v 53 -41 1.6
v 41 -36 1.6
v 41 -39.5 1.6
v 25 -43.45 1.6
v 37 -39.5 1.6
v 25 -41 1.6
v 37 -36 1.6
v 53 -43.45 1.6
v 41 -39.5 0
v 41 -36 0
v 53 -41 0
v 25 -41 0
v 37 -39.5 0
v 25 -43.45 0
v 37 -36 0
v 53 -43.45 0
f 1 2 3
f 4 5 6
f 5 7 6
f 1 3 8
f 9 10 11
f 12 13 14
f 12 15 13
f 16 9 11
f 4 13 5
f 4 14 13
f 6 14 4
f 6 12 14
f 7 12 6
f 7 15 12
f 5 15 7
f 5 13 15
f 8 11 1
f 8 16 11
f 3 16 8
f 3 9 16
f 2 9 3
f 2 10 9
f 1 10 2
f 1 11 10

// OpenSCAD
// Antweight "Passive Aggressive" v0.1 - invertible pusher, passive weapons only.
// Weapon: gravity-hinged wedge with 4 wedgelets (forks). It hangs on two M2 pivot screws between the front
// "mandibles" and drops onto the floor in both orientations; printed ledges on the mandibles stop the swing.
// Rear: three spikes (tail skids). Angry chevron eyes in the lid (transparent inlay), chevron vents.
// Same drive as the racer: 34x10 wheels + N20 (Pololu). Wheels stick out top and bottom (invertible).
// Axle close to the wedge, so an opponent on the wedge loads the wheels; the tail spikes skid on the floor.
// Coordinates = PCB-local: x = width, y = length (y = 0 = narrow PCB edge = front), z = 0 = tub bottom.
// Driving direction is -y.

part = "lid_glass"; // [assembly, tub, lid, lid_glass, wedge, motor_clamp, test_motor, test_hinge, test_wedge]
$fn = 64;

/* [PCB] */
pcb_w = 78;
pcb_l = 56;
pcb_t = 1.6;
pcb_clear = 0.3;
pcb_gap = 0.3;                       // PCB above the motor clamps
pcb_holes = [[9.14, 3.14], [68.86, 3.14], [3.95, 44.56], [74.05, 44.56]];
lid_screw_holes = [0, 1];            // front PCB holes: M2 x 16 through lid boss + PCB into the tub
switch_slot = [[63.65, 38.65], [66.65, 45.65]];
switch_holes = [[65.15, 34.7], [65.15, 49.6]];   // switch mounting holes (pcb-dimensions.DXF)
switch_hole_d = 2;

/* [Components (estimates, measure!)] */
drv_center = [37.93, 15.5];          // DRV8833 in its socket under the PCB
drv_pins = 6;
drv_w = 18;
drv_len = drv_pins * 2.54 + (22.5 - 8 * 2.54);
drv_body = [drv_center - [drv_len / 2, drv_w / 2], drv_center + [drv_len / 2, drv_w / 2]];
drv_h = 9;
esp_body = [[28.1, 31.7], [48.4, 49.5]];
esp_h = 4;                           // ESP32-C3 on top, soldered low (max ~2 mm header spacer)
battery = [50, 30, 8];
battery_y0 = 33;                     // under the PCB, behind the motor clamps

/* [Drive] */
wheel_d = 34;
wheel_w = 10;
wheel_gap = 1;
ground_clearance = 1.5;              // body to floor, both orientations
axle_y = 21;
// N20 (Pololu micro metal gearmotor): gearbox 12 x 10 x 9, can d12 with flats at 10
gearbox_l = 9;
gb_w = 12;
gb_h = 10;
motor_d = 12;
motor_l = 15;
motor_term_l = 3;
shaft_d = 3;
shaft_l = 10;
shaft_boss_d = 5;
motor_fit = 0.25;                    // per side, FDM slide fit
drv_clear = 0.3;

/* [Motor clamp] */
clamp_squeeze = 0.2;
clamp_wall = 1.6;
clamp_top_t = 1.2;
clamp_screw_x = 12;
clamp_screw_margin = 1;
clamp_boss_d = 4.4;
clamp_head_d = 4.2;
clamp_head_recess = 1.6;

/* [Chassis] */
wall = 1.6;
side_t = 2.0;                        // outer wall beside the wheel
front_t = 2.0;
floor_t = 1.2;
lid_t = 1.6;
iw_t = 1.4;
gb_gap = 0.3;
standoff_d = 5;
pilot_d = 1.7;
screw_clear_d = 2.4;
screw_head_d = 4.2;
screw_head_recess = 1.4;
lid_lip_h = 2;
lid_lip_t = 1.2;
lid_fit = 0.2;
snap_x = [25, 53];                   // snaps on the rear wall
snap_r = 0.8;
strap_w = 11;
strap_slot = 2;
strap_x = [33, 45];
edge_c = 1.6;                        // stepped 45 degree chamfer, top and bottom
layer_h = 0.2;

/* [Tail spikes] */
spike_x = [-16, 0, 16];              // relative to the centre line
spike_w = 10;
spike_l = 7;

/* [Wedge + hinge] */
tube_d = 7;                          // hinge tube along the wedge back edge
hinge_gap = 1;                       // tube to body front
hinge_dz = 2.8;                      // pivot above the mid-plane: the plate sits under the pin, evens out both rest angles
pin_pilot_d = 1.7;                   // M2 pivot screw threads into the mandible
pin_clear_d = 2.4;                   // the wedge turns on the screw shank
pin_head_recess = 1.5;
ear_t = 5;                           // mandible thickness
ear_fit = 0.4;                       // per side, wedge to mandible
ear_apex = 8;                        // mandible point ahead of the pivot
ear_r = 4.5;
plate_t = 2.4;
plate_l = 26;                        // pivot to plate edge
plate_corner = 4;
fork_x = [-42, -18, 18, 42];         // wedgelets, relative to the centre line
fork_l = 8;
fork_w0 = 7;
fork_w1 = 2.5;
bevel_l = 12;                        // top bevel back from the fork tips
tip_t = 0.6;
stop_angle = 50;                     // swing limit both ways (from horizontal)
ledge_u = [2.5, 10];                 // stop ledge, distance along the plate from the pivot
ledge_w = 1.5;                       // into the wedge path
ledge_t = 1.5;

/* [Design] */
line_h = 1.0;                        // character line at axle height (slicer height range)
line_d = 0.4;
arch_r = 1.5;
eye_y = 36;
eye_gap = 2;
eye_len = 12;
eye_rise = 5;
eye_w = 3.5;
chev_w = 2.5;
chev_pitch = 5.5;
chev_rise = 0.5;                     // rise per mm half-width (tan of the chevron angle)
floor_chevrons = [[[31, 6], [47, 28]], [[16, 36], [62, 60]]];
lid_vents = [[26, 56.5], [52, 64]];

/* [Colours] */
palette = "stealth_copper"; // [stealth_copper, gunmetal_silver, hazard_red]
// [tub, character line, lid + clamps, eyes, wedge], each [filament, preview hex]
pal = palette == "gunmetal_silver"
        ? [["dark gray", "#3C3F41"], ["copper", "#B87333"], ["silver", "#C4C7CA"], ["transparent", "#E8F0F2"], ["silver", "#C4C7CA"]]
    : palette == "hazard_red"
        ? [["dark gray", "#3C3F41"], ["red", "#C8102E"], ["red", "#C8102E"], ["transparent", "#E8F0F2"], ["silver", "#C4C7CA"]]
        : [["dark gray", "#3C3F41"], ["copper", "#B87333"], ["dark gray", "#2E3032"], ["transparent", "#E8F0F2"], ["copper", "#B87333"]];

// ---------- derived ----------
H = wheel_d - 2 * ground_clearance;
axle_z = H / 2;
clamp_top_z = axle_z + gb_h / 2 - clamp_squeeze + clamp_top_t;
pcb_z = clamp_top_z + pcb_gap;
tub_h = H - lid_t;
motor_total = gearbox_l + motor_l + motor_term_l;
mount_l = gearbox_l + motor_l + motor_fit;
clamp_screw_y = gb_w / 2 + motor_fit + clamp_screw_margin + screw_clear_d / 2;
gf_x = min(drv_body[0][0] - drv_clear - motor_total,
           pcb_w - (drv_body[1][0] + drv_clear + motor_total));
iw_x1 = gf_x - gb_gap;
iw_x0 = iw_x1 - iw_t;
wheel_x0 = iw_x0 - wheel_gap - wheel_w;
ow_x1 = wheel_x0 - wheel_gap;
ow_x0 = ow_x1 - side_t;
cx = pcb_w / 2;
width = pcb_w - 2 * ow_x0;
in_y0 = -pcb_clear;
front_y = in_y0 - front_t;
well_y0 = in_y0;
well_y1 = axle_y + wheel_d / 2 + wheel_gap;
pod_y1 = well_y1 + iw_t;
battery_pos = [cx - battery[0] / 2, battery_y0];
bay_y1 = battery_y0 + battery[1] + 1 + strap_slot + 0.5;
in_y1 = bay_y1 + pcb_clear;
rear_y = in_y1 + wall;
arch_half = sqrt(pow(wheel_d / 2, 2) - pow(axle_z - floor_t, 2)) + wheel_gap;
arch_half_lid = sqrt(pow(wheel_d / 2, 2) - pow(tub_h - axle_z, 2)) + wheel_gap;
n_chamf = round(edge_c / layer_h);
line_z0 = round((axle_z - line_h / 2) / layer_h) * layer_h;

r_k = tube_d / 2;
L_tot = plate_l + fork_l;
z_h = axle_z + hinge_dz;
y_h = front_y - r_k - hinge_gap;
ear_in = ow_x0 + ear_t;
wx0 = ear_in + ear_fit;
wx1 = pcb_w - wx0;
// resting on wheels + tail spikes: body bottom height above the floor at the pivot
y_skid = rear_y + spike_l - edge_c / sin(atan(spike_w / 2 / spike_l));
lift = ground_clearance * (1 + (axle_y - y_h) / (y_skid - axle_y));
h_up = z_h + lift;
h_dn = H - z_h + lift;
rest_up = asin(h_up / sqrt(pow(L_tot, 2) + pow(r_k, 2))) - atan2(r_k, L_tot);
rest_dn = asin(h_dn / sqrt(pow(L_tot, 2) + pow(r_k - tip_t, 2))) + atan2(r_k - tip_t, L_tot);
tip_y = y_h - (L_tot * cos(rest_up) + r_k * sin(rest_up));

echo(str("Passive Aggressive ", width, " x ", rear_y + spike_l - tip_y, " x ", H, " mm (wedge resting), body ",
         rear_y + spike_l - front_y, " mm, wheels +-", ground_clearance, " mm"));
echo(str("Wedge rest angle upright ", rest_up, " deg, inverted ", rest_dn, " deg, stops +-", stop_angle,
         " deg, pivot y ", y_h, " z ", z_h));
echo(str("PCB bottom z = ", pcb_z, ", ESP top ", pcb_z + pcb_t + esp_h, " / lid underside ", tub_h,
         ", lid boss ", tub_h - pcb_z - pcb_t, " mm"));
echo(str("Colours: tub ", pal[0][0], " with ", pal[1][0], " band z ", line_z0, "-", line_z0 + line_h,
         "; lid + clamps ", pal[2][0], "; eyes ", pal[3][0], "; wedge ", pal[4][0]));
echo("Screws: 2x M2x10 pivot (threadlock), 2x M2x16 lid, 2x M2x6 rear PCB, 4x M2x10 motor clamps");

assert(well_y1 + iw_t <= 41 - pcb_clear, "wheel well hits wide PCB part");
assert(gf_x - shaft_l > ow_x1, "motor shaft hits outer wall");
assert(pcb_z + pcb_t + esp_h <= tub_h - 0.5, "ESP32 hits the lid");
assert(floor_t + battery[2] < pcb_z - drv_h, "battery hits the DRV8833 under the PCB");
assert(min(strap_x) - strap_w / 2 > gf_x + mount_l && max(strap_x) + strap_w / 2 < pcb_w - gf_x - mount_l,
       "strap slot hits motor cradle");
assert(battery_y0 > axle_y + clamp_screw_y + clamp_boss_d / 2, "battery hits clamp boss");
assert(rest_up < stop_angle - 5 && rest_dn < stop_angle - 5, "wedge rests on its stop, not on the floor");
assert(sqrt(pow(ledge_u[0], 2) + pow(r_k, 2)) > r_k + 0.5, "stop ledge hits the hinge tube");

// ---------- 2D helpers ----------
module mirror_x(m) {
    if (m == 0) children();
    else translate([pcb_w, 0, 0]) mirror([1, 0, 0]) children();
}

module rrect(r0, r1, r) translate([r0[0] + r, r0[1] + r]) offset(r = r) square([r1[0] - r0[0] - 2 * r, r1[1] - r0[1] - 2 * r]);

module slot2d(p0, p1, w) hull() { translate(p0) circle(d = w); translate(p1) circle(d = w); }

module pcb_outline()
    polygon([[6, 0], [72, 0], [72, 41], [78, 41], [78, 48], [70, 56],
             [8, 56], [0, 48], [0, 41], [6, 41]]);

module core2d() hull() {
    pcb_outline();
    translate(battery_pos) square([battery[0], bay_y1 - battery_y0]);
}

module pod2d() translate([ow_x0, front_y]) square([width, pod_y1 - front_y]);

module hull2d() hull() { pod2d(); offset(delta = pcb_clear + wall) core2d(); }

module spikes2d()
    for (dx = spike_x) translate([cx + dx, rear_y - 0.01])
        polygon([[-spike_w / 2, 0], [spike_w / 2, 0], [0, spike_l]]);

// coffin plan: wide wheel pods at the front, tapering tail with spikes
module plan() union() { hull2d(); spikes2d(); }

module outline_inner() intersection() {
    offset(delta = -wall) hull2d();
    translate([-50, in_y0]) square([200, 200]);
}

module well_rect() translate([ow_x1, well_y0]) square([iw_x0 - ow_x1, well_y1 - well_y0]);

module well_zone2d() translate([-50, -50]) square([iw_x1 + lid_fit + 50, pod_y1 + lid_fit + 50]);

module arch_opening(half) rrect([ow_x1, axle_y - half], [iw_x0, axle_y + half], arch_r);

// chevrons pointing forward (-y), clipped to the rectangle
module chevrons2d(r0, r1) intersection() {
    translate(r0 + [chev_w / 2, chev_w / 2]) square(r1 - r0 - [chev_w, chev_w]);
    mx = (r0[0] + r1[0]) / 2;
    rise = (mx - r0[0]) * chev_rise;
    for (y = [r0[1] - rise : chev_pitch : r1[1]]) {
        slot2d([r0[0], y + rise], [mx, y], chev_w);
        slot2d([mx, y], [r1[0], y + rise], chev_w);
    }
}

// angry eyes: slits rising to the outside, inner ends forward
module eyes2d()
    for (s = [-1, 1])
        polygon([[cx + s * eye_gap, eye_y], [cx + s * (eye_gap + eye_len), eye_y + eye_rise],
                 [cx + s * (eye_gap + eye_len), eye_y + eye_rise + eye_w * 0.7], [cx + s * eye_gap, eye_y + eye_w]]);

module switch_win2d() {
    translate(switch_slot[0]) square(switch_slot[1] - switch_slot[0]);
    for (p = switch_holes) translate(p) circle(d = switch_hole_d);
}

// ---------- 3D helpers ----------
module yz_extrude(x0, w) translate([x0, 0, 0]) rotate([90, 0, 90]) linear_extrude(w) children();

// body slab with stepped 45 degree chamfers top and bottom, clipped to z0..z1
module body_solid(z0 = 0, z1 = H) intersection() {
    union() {
        for (i = [0 : n_chamf - 1]) {
            d = edge_c - (i + 0.5) * layer_h;
            translate([0, 0, i * layer_h]) linear_extrude(layer_h + 0.01) offset(delta = -d) plan();
            translate([0, 0, H - (i + 1) * layer_h]) linear_extrude(layer_h + 0.01) offset(delta = -d) plan();
        }
        translate([0, 0, edge_c]) linear_extrude(H - 2 * edge_c + 0.01) plan();
    }
    translate([-100, -100, z0]) cube([400, 400, z1 - z0]);
}

// (y, z) side view around the pivot: u forward (-y), v up
module hinge2d() translate([y_h, z_h]) mirror([1, 0]) children();

// ---------- motor mount ----------
module motor_cavity() {
    w = gb_w + 2 * motor_fit;
    translate([0, axle_y, axle_z]) {
        yz_extrude(iw_x1 - 0.01, gf_x - iw_x1 + gearbox_l + motor_fit + 0.01)
            translate([-w / 2, -gb_h / 2]) square([w, gb_h - clamp_squeeze]);
        yz_extrude(gf_x + gearbox_l, motor_l + motor_term_l + 2) intersection() {
            circle(d = motor_d + 2 * motor_fit);
            translate([-w / 2, -gb_h / 2]) square([w, gb_h - clamp_squeeze]);
        }
    }
}

module clamp_screws(z, h, d) {
    for (s = [-1, 1]) translate([gf_x + clamp_screw_x, axle_y + s * clamp_screw_y, z]) cylinder(d = d, h = h);
}

module clamp_ears(z, h) {
    cw = gb_w + 2 * motor_fit;
    for (s = [-1, 1]) hull() {
        translate([gf_x + clamp_screw_x, axle_y + s * clamp_screw_y, z]) cylinder(d = clamp_boss_d, h = h);
        translate([gf_x + clamp_screw_x - clamp_boss_d / 2, axle_y + (s < 0 ? -cw / 2 - clamp_wall : cw / 2), z])
            cube([clamp_boss_d, clamp_wall, h]);
    }
}

module motor_cradle() {
    x0 = iw_x1 - 0.01;
    l = gf_x + mount_l - x0;
    cw = gb_w + 2 * motor_fit;
    difference() {
        union() {
            translate([x0, axle_y - cw / 2 - clamp_wall, axle_z - gb_h / 2 - 1.2])
                cube([l, cw + 2 * clamp_wall, gb_h / 2 + 1.2]);
            for (s = [-1, 1]) translate([x0, axle_y + (s < 0 ? -cw / 2 - clamp_wall : cw / 2), 0])
                cube([l, clamp_wall, axle_z]);
            for (rx = [x0, gf_x + gearbox_l - 1, gf_x + mount_l - clamp_wall])
                translate([rx, axle_y - cw / 2, 0]) cube([clamp_wall, cw, axle_z]);
            clamp_ears(0, axle_z);
        }
        motor_cavity();
        clamp_screws(axle_z - 8, 9, pilot_d);
    }
}

module motor_clamp() {
    x0 = iw_x1 + 0.2;
    cw = gb_w + 2 * motor_fit;
    difference() {
        union() {
            translate([x0, axle_y - cw / 2 - clamp_wall, axle_z])
                cube([gf_x + mount_l - x0, cw + 2 * clamp_wall, clamp_top_z - axle_z]);
            clamp_ears(axle_z, clamp_top_z - axle_z);
        }
        motor_cavity();
        clamp_screws(axle_z - 1, clamp_top_z - axle_z + 2, screw_clear_d);
        clamp_screws(clamp_top_z - clamp_head_recess, clamp_head_recess + 1, clamp_head_d);
    }
}

// ---------- mandibles (wedge hinge ears with swing stops) ----------
module ledges2d() hinge2d() {
    rotate(-stop_angle) translate([ledge_u[0], -r_k - ledge_t]) square([ledge_u[1] - ledge_u[0], ledge_t]);
    rotate(stop_angle) translate([ledge_u[0], -r_k + plate_t]) square([ledge_u[1] - ledge_u[0], ledge_t]);
}

module ear2d() union() {
    hull() {
        translate([front_y - 0.01, 0]) square([0.01, H]);
        translate([y_h - 2, 0]) square([0.01, H]);
        translate([y_h, z_h]) circle(r = ear_r);
        translate([y_h - ear_apex, z_h]) circle(r = 0.5);
        ledges2d();
    }
    // root into the front wall, below the lid
    translate([front_y - 0.01, 0]) square([edge_c + 0.01, tub_h]);
}

module ears() for (m = [0, 1]) mirror_x(m) difference() {
    union() {
        yz_extrude(ow_x0, ear_t) ear2d();
        yz_extrude(ear_in - 0.01, ledge_w + 0.01) ledges2d();
    }
    translate([ow_x0 - 1, y_h, z_h]) rotate([0, 90, 0]) cylinder(d = pin_pilot_d, h = ear_t + 2);
    translate([ow_x0 - 1, y_h, z_h]) rotate([0, 90, 0]) cylinder(d = screw_head_d, h = pin_head_recess + 1);
}

// ---------- tub ----------
module well_boxes()
    intersection() {
        body_solid(0, tub_h);
        for (m = [0, 1]) mirror_x(m) linear_extrude(tub_h) difference() {
            offset(delta = iw_t) well_rect();
            well_rect();
        }
    }

module character_line()
    translate([0, 0, line_z0]) linear_extrude(line_h) difference() {
        offset(delta = 1) plan();
        offset(delta = -line_d) plan();
    }

module tub() {
    difference() {
        union() {
            difference() {
                union() {
                    difference() {
                        body_solid(0, tub_h);
                        translate([0, 0, floor_t]) linear_extrude(tub_h) outline_inner();
                    }
                    well_boxes();
                }
                character_line();
            }
            ears();
            for (m = [0, 1]) mirror_x(m) motor_cradle();
            for (p = pcb_holes) translate([p[0], p[1], 0]) cylinder(d = standoff_d, h = pcb_z);
        }
        for (m = [0, 1]) mirror_x(m) {
            translate([0, 0, -1]) linear_extrude(floor_t + 2) arch_opening(arch_half);
            // open-top shaft slot: motor with wheel fitted drops straight in
            hull() for (z = [axle_z, tub_h + 1])
                translate([iw_x0 - 1, axle_y, z]) rotate([0, 90, 0]) cylinder(d = shaft_boss_d, h = iw_t + 2);
        }
        for (p = pcb_holes) translate([p[0], p[1], pcb_z - 8]) cylinder(d = pilot_d, h = 9);
        for (sx = strap_x, sy = [battery_pos[1] - 1 - strap_slot, battery_pos[1] + battery[1] + 1])
            translate([sx - strap_w / 2, sy, -1]) cube([strap_w, strap_slot, floor_t + 2]);
        translate([0, 0, -1]) linear_extrude(floor_t + 2) for (r = floor_chevrons) chevrons2d(r[0], r[1]);
        for (sx = snap_x) translate([sx, in_y1, tub_h - lid_lip_h / 2]) sphere(r = snap_r);
    }
}

// ---------- lid (prints upside down) ----------
module lid() {
    difference() {
        union() {
            body_solid(tub_h, H);
            translate([0, 0, tub_h - lid_lip_h]) linear_extrude(lid_lip_h + 0.01) difference() {
                offset(delta = -lid_fit) outline_inner();
                offset(delta = -lid_fit - lid_lip_t) outline_inner();
                for (m = [0, 1]) mirror_x(m) well_zone2d();
            }
            for (i = lid_screw_holes) translate([pcb_holes[i][0], pcb_holes[i][1], pcb_z + pcb_t])
                cylinder(d = standoff_d, h = tub_h - pcb_z - pcb_t + 0.01);
            for (sx = snap_x) translate([sx, in_y1 - lid_fit, tub_h - lid_lip_h / 2]) sphere(r = snap_r - 0.2);
        }
        for (m = [0, 1]) mirror_x(m) translate([0, 0, tub_h - 1]) linear_extrude(lid_t + 2) arch_opening(arch_half_lid);
        for (i = lid_screw_holes) {
            translate([pcb_holes[i][0], pcb_holes[i][1], pcb_z]) cylinder(d = screw_clear_d, h = H);
            translate([pcb_holes[i][0], pcb_holes[i][1], H - screw_head_recess]) cylinder(d = screw_head_d, h = 2);
        }
        translate([0, 0, tub_h - 1]) linear_extrude(lid_t + 2) {
            switch_win2d();
            chevrons2d(lid_vents[0], lid_vents[1]);
        }
        translate([0, 0, tub_h - 1]) linear_extrude(lid_t + 2) eyes2d();
    }
}

// transparent inlay for the eyes: load as extra part of the lid (same transform)
module lid_glass() translate([0, 0, tub_h]) linear_extrude(lid_t) eyes2d();

// ---------- wedge ----------
module wedge_plan2d() {
    polygon([[wx0, 0], [wx1, 0], [wx1, plate_l - plate_corner], [wx1 - plate_corner, plate_l],
             [wx0 + plate_corner, plate_l], [wx0, plate_l - plate_corner]]);
    for (fx = fork_x) translate([cx + fx, 0])
        polygon([[-fork_w0 / 2, plate_l - 0.01], [fork_w0 / 2, plate_l - 0.01], [fork_w1 / 2, L_tot], [-fork_w1 / 2, L_tot]]);
}

// local frame: x = width, y = u (forward from the pivot), z = v; pivot on the x axis, plate under the pin
module wedge_local() difference() {
    union() {
        intersection() {
            translate([0, 0, -r_k]) linear_extrude(plate_t) wedge_plan2d();
            yz_extrude(wx0 - 1, wx1 - wx0 + 2)
                polygon([[-1, -r_k - 1], [L_tot + 1, -r_k - 1], [L_tot + 1, -r_k + tip_t],
                         [L_tot - bevel_l, -r_k + plate_t + 0.01], [-1, -r_k + plate_t + 0.01]]);
        }
        translate([wx0, 0, 0]) rotate([0, 90, 0]) cylinder(d = tube_d, h = wx1 - wx0);
    }
    translate([wx0 - 1, 0, 0]) rotate([0, 90, 0]) cylinder(d = pin_clear_d, h = wx1 - wx0 + 2);
}

module wedge_placed(a) translate([pcb_w, y_h, z_h]) rotate([0, 0, 180]) rotate([a, 0, 0]) wedge_local();

// ---------- ghost components ----------
module ghosts() {
    for (m = [0, 1]) mirror_x(m) {
        color("black", 0.6) translate([wheel_x0, axle_y, axle_z]) rotate([0, 90, 0]) cylinder(d = wheel_d, h = wheel_w);
        color("silver", 0.6) translate([0, axle_y, axle_z]) {
            yz_extrude(gf_x, gearbox_l) square([gb_w, gb_h], center = true);
            yz_extrude(gf_x + gearbox_l, motor_l) intersection() {
                circle(d = motor_d);
                square([gb_w, gb_h], center = true);
            }
        }
        color("silver", 0.6) translate([gf_x - shaft_l, axle_y, axle_z]) rotate([0, 90, 0]) cylinder(d = shaft_d, h = shaft_l);
    }
    color("green", 0.5) translate([0, 0, pcb_z]) linear_extrude(pcb_t) pcb_outline();
    color("purple", 0.6) translate([drv_body[0][0], drv_body[0][1], pcb_z - drv_h])
        cube([drv_body[1][0] - drv_body[0][0], drv_body[1][1] - drv_body[0][1], drv_h]);
    color("blue", 0.6) translate([esp_body[0][0], esp_body[0][1], pcb_z + pcb_t])
        cube([esp_body[1][0] - esp_body[0][0], esp_body[1][1] - esp_body[0][1], esp_h]);
    color("orange", 0.6) translate([battery_pos[0], battery_pos[1], floor_t]) cube(battery);
}

module assembly() {
    color(pal[0][1]) render() tub();
    color(pal[1][1]) translate([0, 0, line_z0 + 0.01]) linear_extrude(line_h - 0.02) difference() {
        offset(delta = -line_d + 0.05) plan();
        offset(delta = -wall) plan();
    }
    color(pal[2][1]) render() lid();
    color(pal[3][1], 0.6) lid_glass();
    color(pal[2][1]) for (m = [0, 1]) mirror_x(m) motor_clamp();
    color(pal[4][1]) wedge_placed(-rest_up);
    ghosts();
}

// shown level; on the floor it rests on the wheels and the tail spikes, the wedge on the floor
// lid + lid_glass share one transform: load them together as one multi-part object
if (part == "assembly") assembly();
else if (part == "tub") color(pal[0][1]) tub();
else if (part == "lid") color(pal[2][1]) translate([0, 0, H]) rotate([180, 0, 0]) lid();
else if (part == "lid_glass") color(pal[3][1]) translate([0, 0, H]) rotate([180, 0, 0]) lid_glass();
// prints flat on the plate underside, tube on the bed
else if (part == "wedge") color(pal[4][1]) translate([0, 0, r_k]) wedge_local();
// print 2x; the same part fits left and right (rotate 180 deg)
else if (part == "motor_clamp") color(pal[2][1]) translate([0, 0, clamp_top_z]) rotate([180, 0, 0]) translate([-gf_x, -axle_y, 0]) motor_clamp();
else if (part == "test_motor")
    intersection() { tub(); translate([iw_x0 - 1, axle_y - clamp_screw_y - clamp_boss_d, -1]) cube([mount_l + 4, 2 * (clamp_screw_y + clamp_boss_d), axle_z + 1]); }
// left mandible + front corner, and the matching left end of the wedge
else if (part == "test_hinge")
    intersection() { tub(); translate([ow_x0 - 1, y_h - ear_apex - 2, -1]) cube([ear_t + 14, front_y - y_h + ear_apex + 8, H + 2]); }
else if (part == "test_wedge")
    intersection() { translate([0, 0, r_k]) wedge_local(); translate([wx0 - 1, -r_k - 1, -1]) cube([16, L_tot + r_k + 2, tube_d + 2]); }
